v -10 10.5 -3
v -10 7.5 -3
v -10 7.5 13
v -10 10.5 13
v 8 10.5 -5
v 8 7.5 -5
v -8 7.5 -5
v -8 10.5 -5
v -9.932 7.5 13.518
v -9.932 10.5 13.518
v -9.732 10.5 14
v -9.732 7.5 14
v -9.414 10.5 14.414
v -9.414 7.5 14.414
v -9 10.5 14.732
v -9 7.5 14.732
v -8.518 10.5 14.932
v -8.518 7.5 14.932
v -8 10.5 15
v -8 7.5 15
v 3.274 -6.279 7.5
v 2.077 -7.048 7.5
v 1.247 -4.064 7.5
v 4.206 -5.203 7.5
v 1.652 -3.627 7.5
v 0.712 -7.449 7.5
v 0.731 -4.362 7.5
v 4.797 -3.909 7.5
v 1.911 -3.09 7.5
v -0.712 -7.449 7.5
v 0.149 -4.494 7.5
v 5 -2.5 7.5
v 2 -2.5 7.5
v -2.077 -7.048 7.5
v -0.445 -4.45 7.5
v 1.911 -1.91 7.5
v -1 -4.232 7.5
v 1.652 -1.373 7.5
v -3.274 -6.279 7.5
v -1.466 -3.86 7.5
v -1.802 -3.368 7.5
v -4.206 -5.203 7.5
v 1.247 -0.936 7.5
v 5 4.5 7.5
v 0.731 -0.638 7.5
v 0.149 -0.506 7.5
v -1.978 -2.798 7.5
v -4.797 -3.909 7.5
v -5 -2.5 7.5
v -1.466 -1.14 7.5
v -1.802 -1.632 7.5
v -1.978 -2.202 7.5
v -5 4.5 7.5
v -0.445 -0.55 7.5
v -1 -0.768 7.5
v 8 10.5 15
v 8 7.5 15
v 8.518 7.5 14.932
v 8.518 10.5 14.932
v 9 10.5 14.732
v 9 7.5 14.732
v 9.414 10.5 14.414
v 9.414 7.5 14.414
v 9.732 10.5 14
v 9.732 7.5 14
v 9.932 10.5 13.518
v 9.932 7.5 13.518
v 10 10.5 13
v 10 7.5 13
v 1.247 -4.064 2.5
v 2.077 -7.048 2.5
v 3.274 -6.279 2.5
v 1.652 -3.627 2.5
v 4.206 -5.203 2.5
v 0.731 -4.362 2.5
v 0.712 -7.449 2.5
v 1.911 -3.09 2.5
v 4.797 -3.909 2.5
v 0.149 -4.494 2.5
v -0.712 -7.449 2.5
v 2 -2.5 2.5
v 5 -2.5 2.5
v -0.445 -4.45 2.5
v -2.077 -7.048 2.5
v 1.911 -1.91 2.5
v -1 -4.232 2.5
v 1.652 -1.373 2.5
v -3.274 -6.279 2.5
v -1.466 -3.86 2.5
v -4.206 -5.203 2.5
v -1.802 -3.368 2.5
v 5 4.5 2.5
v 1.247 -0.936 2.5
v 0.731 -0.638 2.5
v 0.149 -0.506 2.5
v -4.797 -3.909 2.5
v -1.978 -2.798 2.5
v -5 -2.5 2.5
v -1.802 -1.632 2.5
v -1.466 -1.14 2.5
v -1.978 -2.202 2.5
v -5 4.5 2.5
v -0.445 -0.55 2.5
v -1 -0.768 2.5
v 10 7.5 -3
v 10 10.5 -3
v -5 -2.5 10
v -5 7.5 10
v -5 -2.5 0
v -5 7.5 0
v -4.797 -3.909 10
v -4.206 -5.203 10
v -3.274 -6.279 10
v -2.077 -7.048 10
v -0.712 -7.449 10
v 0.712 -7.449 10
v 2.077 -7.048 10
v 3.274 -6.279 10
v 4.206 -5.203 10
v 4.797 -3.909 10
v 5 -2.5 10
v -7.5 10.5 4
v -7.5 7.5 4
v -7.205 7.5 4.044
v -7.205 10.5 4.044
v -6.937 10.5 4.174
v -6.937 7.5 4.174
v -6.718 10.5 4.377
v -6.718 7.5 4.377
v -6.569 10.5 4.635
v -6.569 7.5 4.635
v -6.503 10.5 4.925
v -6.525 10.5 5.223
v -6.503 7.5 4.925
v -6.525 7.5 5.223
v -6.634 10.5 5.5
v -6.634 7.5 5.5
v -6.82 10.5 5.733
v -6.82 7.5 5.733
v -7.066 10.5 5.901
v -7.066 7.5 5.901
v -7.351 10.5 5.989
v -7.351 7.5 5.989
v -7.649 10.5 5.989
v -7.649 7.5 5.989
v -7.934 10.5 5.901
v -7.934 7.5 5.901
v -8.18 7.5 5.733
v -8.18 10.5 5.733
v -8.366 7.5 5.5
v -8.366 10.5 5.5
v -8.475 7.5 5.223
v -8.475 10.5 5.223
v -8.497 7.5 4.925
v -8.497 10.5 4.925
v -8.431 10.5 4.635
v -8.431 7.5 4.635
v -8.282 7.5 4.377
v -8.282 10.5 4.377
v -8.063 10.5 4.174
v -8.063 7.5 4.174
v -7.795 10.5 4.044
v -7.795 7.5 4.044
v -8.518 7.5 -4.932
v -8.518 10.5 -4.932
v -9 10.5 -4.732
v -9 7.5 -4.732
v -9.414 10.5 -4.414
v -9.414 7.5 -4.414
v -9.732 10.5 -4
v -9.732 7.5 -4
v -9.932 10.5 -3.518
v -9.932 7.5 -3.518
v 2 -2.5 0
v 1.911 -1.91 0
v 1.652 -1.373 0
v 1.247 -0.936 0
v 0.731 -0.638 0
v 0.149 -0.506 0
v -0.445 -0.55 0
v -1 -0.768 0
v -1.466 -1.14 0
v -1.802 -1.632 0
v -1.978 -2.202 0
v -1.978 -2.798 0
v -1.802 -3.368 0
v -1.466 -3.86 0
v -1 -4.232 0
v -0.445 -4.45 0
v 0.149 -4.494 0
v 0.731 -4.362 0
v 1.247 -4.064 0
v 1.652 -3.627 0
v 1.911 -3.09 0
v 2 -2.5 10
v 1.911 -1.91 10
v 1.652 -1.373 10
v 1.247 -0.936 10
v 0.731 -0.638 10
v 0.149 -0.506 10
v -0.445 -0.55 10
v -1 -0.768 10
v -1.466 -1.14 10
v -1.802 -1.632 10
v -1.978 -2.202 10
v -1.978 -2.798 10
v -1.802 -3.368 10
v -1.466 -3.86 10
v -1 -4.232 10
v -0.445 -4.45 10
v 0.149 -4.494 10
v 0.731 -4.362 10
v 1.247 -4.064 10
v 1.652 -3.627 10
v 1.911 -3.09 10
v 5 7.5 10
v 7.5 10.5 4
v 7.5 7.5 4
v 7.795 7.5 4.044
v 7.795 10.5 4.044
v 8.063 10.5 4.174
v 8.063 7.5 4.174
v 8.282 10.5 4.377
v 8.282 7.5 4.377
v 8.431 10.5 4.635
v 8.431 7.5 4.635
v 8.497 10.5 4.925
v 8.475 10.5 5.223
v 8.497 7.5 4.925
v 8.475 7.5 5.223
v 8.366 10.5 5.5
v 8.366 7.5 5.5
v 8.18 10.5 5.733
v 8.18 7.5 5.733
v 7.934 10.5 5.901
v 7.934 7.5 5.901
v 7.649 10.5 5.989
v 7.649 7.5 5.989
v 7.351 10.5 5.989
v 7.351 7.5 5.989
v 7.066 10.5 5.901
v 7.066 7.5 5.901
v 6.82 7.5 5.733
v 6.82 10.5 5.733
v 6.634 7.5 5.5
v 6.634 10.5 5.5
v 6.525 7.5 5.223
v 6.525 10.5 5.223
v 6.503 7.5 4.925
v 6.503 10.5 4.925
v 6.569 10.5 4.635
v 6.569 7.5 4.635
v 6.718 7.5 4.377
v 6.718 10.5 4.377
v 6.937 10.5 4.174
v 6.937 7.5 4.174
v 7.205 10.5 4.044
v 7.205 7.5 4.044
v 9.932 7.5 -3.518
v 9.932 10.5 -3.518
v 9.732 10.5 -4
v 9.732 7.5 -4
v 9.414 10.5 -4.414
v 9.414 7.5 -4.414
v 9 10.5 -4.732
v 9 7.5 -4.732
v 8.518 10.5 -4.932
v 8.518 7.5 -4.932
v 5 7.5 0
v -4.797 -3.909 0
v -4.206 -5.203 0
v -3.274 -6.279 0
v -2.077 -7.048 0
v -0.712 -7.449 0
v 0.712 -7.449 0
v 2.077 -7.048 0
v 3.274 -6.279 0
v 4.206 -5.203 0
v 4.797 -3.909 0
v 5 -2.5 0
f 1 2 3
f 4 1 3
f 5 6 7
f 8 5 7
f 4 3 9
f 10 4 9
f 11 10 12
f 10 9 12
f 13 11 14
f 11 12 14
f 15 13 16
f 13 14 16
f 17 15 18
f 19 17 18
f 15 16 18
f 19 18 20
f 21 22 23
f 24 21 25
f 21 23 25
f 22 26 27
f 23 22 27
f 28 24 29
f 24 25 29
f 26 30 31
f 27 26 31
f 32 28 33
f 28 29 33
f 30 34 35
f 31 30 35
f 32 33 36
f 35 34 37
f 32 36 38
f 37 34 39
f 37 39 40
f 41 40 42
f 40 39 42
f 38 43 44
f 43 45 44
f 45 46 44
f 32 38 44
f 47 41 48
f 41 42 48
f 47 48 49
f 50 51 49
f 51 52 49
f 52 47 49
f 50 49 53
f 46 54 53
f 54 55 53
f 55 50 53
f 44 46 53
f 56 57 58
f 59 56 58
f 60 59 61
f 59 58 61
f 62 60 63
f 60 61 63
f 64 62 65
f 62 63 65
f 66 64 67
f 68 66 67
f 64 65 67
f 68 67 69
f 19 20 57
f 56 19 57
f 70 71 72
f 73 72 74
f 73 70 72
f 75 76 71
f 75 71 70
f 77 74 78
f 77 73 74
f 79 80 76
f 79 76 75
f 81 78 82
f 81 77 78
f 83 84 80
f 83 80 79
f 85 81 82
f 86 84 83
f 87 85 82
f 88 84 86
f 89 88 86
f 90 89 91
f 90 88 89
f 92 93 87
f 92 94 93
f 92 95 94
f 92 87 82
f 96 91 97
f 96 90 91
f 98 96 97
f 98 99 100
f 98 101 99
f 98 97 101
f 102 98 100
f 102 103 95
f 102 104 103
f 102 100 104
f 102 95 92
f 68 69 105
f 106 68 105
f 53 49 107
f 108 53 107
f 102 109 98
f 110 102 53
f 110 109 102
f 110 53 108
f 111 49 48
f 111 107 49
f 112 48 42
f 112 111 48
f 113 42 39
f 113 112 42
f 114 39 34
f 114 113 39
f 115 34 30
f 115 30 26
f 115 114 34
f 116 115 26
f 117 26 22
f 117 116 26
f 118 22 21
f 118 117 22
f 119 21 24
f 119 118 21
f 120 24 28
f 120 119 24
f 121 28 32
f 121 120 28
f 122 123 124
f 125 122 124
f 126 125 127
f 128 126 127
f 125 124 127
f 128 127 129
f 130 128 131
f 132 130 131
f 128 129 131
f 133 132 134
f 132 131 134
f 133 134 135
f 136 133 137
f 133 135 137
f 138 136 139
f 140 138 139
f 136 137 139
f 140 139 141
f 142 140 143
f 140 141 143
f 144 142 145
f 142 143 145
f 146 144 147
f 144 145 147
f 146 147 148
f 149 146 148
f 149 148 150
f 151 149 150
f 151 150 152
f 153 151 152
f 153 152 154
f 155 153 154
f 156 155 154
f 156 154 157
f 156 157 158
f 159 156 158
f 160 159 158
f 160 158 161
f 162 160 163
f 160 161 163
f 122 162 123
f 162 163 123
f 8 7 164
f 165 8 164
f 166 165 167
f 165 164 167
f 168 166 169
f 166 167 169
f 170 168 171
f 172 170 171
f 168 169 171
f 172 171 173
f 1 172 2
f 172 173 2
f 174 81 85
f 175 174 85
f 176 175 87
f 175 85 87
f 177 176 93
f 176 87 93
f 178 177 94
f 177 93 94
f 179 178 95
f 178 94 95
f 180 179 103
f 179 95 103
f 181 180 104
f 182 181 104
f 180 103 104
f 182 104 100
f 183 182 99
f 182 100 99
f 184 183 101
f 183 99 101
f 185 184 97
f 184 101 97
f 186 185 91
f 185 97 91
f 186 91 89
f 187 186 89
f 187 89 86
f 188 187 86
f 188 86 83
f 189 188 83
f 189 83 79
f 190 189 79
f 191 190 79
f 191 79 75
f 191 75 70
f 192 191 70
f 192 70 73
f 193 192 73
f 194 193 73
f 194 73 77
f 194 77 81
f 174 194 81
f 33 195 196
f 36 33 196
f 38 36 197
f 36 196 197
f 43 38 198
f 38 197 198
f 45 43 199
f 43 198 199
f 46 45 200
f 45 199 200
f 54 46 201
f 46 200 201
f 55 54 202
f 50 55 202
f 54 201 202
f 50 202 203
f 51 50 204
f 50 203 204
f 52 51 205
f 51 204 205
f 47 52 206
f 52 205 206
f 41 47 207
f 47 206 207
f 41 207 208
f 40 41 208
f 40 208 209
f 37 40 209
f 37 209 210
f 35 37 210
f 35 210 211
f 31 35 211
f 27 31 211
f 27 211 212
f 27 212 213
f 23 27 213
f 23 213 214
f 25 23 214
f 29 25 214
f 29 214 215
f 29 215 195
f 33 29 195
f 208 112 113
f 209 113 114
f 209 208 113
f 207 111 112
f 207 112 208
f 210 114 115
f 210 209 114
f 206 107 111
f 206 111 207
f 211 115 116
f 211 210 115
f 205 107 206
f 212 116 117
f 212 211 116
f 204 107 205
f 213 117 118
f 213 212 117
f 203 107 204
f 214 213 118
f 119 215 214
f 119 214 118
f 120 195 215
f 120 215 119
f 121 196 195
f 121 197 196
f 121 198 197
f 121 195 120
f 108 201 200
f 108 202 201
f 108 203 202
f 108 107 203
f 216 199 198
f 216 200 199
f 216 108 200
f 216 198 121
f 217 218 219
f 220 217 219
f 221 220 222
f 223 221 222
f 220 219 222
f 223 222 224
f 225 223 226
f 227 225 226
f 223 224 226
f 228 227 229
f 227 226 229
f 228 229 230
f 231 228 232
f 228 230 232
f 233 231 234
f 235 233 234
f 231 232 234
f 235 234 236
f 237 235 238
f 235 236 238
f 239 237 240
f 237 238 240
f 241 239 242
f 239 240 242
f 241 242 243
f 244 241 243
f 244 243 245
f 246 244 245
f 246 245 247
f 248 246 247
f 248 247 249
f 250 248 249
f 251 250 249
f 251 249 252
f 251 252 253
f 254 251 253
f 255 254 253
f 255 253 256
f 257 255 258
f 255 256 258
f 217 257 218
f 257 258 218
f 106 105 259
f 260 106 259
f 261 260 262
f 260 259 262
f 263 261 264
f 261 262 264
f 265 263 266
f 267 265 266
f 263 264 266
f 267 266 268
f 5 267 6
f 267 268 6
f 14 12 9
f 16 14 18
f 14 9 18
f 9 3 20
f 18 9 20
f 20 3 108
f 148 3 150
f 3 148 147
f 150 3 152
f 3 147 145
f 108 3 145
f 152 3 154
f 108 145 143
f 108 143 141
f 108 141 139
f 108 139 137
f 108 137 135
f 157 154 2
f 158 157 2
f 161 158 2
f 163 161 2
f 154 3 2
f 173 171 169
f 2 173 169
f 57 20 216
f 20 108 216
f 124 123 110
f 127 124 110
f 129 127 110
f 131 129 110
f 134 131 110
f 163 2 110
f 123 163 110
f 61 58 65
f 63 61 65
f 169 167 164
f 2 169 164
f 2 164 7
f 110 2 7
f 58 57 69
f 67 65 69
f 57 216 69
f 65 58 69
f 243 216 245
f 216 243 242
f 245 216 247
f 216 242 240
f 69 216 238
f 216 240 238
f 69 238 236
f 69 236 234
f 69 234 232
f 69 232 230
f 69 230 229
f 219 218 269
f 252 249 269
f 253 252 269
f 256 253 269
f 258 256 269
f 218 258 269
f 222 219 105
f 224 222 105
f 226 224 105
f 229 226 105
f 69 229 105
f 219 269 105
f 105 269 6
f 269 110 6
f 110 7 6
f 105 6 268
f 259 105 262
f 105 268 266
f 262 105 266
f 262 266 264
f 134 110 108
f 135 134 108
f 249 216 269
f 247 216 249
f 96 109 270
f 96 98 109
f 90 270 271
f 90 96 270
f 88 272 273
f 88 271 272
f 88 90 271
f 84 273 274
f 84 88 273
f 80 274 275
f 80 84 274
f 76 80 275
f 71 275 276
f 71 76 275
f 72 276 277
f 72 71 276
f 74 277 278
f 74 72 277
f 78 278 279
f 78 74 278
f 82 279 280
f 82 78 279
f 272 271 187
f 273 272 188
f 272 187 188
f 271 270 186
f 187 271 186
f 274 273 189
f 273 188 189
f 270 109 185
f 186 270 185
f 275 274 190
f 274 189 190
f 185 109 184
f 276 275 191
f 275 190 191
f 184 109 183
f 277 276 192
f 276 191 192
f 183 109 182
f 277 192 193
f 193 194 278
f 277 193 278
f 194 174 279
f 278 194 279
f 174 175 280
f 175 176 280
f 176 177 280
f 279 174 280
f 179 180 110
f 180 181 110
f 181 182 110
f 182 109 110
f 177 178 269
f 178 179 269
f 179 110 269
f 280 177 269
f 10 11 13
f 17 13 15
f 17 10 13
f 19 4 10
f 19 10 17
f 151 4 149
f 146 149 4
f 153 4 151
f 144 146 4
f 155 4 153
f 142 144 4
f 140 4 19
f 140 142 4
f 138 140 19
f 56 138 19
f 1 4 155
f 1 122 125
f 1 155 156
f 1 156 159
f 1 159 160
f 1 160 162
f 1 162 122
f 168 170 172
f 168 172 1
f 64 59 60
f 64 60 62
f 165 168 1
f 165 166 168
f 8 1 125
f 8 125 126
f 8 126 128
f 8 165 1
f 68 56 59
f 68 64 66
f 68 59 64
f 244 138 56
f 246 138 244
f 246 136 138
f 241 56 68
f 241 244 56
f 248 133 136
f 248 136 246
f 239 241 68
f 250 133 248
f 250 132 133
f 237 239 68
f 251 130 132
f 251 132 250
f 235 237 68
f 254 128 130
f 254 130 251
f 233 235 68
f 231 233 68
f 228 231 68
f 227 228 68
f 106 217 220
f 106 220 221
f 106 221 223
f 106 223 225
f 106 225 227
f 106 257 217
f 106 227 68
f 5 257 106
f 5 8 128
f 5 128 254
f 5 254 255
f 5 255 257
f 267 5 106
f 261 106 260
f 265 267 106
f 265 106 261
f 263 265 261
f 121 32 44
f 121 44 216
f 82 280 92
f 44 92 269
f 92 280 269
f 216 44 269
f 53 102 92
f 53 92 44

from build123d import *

# Parameters (mm, degrees)
ESQUISSE1_W             = 10
ESQUISSE1_H             = 15
BOSS_EXTRU_1_DEPTH      = 10
CONG_1_RADIUS           = 5
CONG_1_LENGTH           = 10
ESQUISSE3_W             = 5
ESQUISSE3_H             = 12
ENL_V_MAT_EXTRU_1_DEPTH = 10
ESQUISSE4_W             = 10
ESQUISSE4_H             = 10
BOSS_EXTRU_2_DEPTH      = 3
ESQUISSE5_R             = 1
ENL_V_MAT_EXTRU_2_DEPTH = 3
ESQUISSE6_R             = 2
ENL_V_MAT_EXTRU_3_DEPTH = 21.862646045


with BuildPart() as part:
    # Esquisse1 → Boss.-Extru.1 (new body)
    with BuildSketch(Plane.XY):
        Rectangle(ESQUISSE1_W, ESQUISSE1_H)
    extrude(amount=BOSS_EXTRU_1_DEPTH)

    # Congé1: full round fillet: the end face becomes a half cylinder, R = half its width
    cong_1_face = Plane((0, -7.5, 5), x_dir=(0, 0, 1), z_dir=(0, -1, 0))  # on the end face: x along it, z out of the body
    cong_1_slab = cong_1_face.offset(-CONG_1_RADIUS / 2) * Box(CONG_1_LENGTH, 2 * CONG_1_RADIUS, CONG_1_RADIUS, mode=Mode.PRIVATE)  # the body's end, R deep
    cong_1_round = Plane((0, -2.5, 5), x_dir=(0, -1, 0), z_dir=(0, 0, 1)) * Cylinder(CONG_1_RADIUS, CONG_1_LENGTH, mode=Mode.PRIVATE)  # its axis R under the face
    add(cong_1_slab - cong_1_round, mode=Mode.SUBTRACT)

    # Esquisse3 → Enlèv. mat.-Extru.1 (cut)
    with BuildSketch(Plane.ZY.offset(5)):
        with Locations((5, -1.5)):
            Rectangle(ESQUISSE3_W, ESQUISSE3_H)
    extrude(amount=-ENL_V_MAT_EXTRU_1_DEPTH, mode=Mode.SUBTRACT)

    # Esquisse4 → Boss.-Extru.2 (add)
    # profile 1 of 2: a face of its own
    with BuildSketch(Plane(origin=(0, 7.5, 0), x_dir=(1, 0, 0), z_dir=(0, 1, 0))):
        with BuildLine():
            Line((8, 5), (-8, 5))
            ThreePointArc((-8, 5), (-9.414213562, 4.414213562), (-10, 3))
            Line((-10, 3), (-10, -13))
            ThreePointArc((-10, -13), (-9.414213562, -14.414213562), (-8, -15))
            Line((-8, -15), (8, -15))
            ThreePointArc((8, -15), (9.414213562, -14.414213562), (10, -13))
            Line((10, -13), (10, 3))
            ThreePointArc((10, 3), (9.414213562, 4.414213562), (8, 5))
        make_face()
        with Locations((0, -5)):
            Rectangle(ESQUISSE4_W, ESQUISSE4_H, mode=Mode.SUBTRACT)
    # profile 2 of 2: a face of its own
    with BuildSketch(Plane(origin=(0, 7.5, 0), x_dir=(1, 0, 0), z_dir=(0, 1, 0))):
        with Locations((0, -5)):
            Rectangle(ESQUISSE4_W, ESQUISSE4_H)
    extrude(amount=BOSS_EXTRU_2_DEPTH)

    # Esquisse5 → Enlèv. mat.-Extru.2 (cut)
    with BuildSketch(Plane.XZ.offset(-7.5)):
        with Locations(Location((-7.5, 5, 0), (0, 0, 270))):
            Circle(ESQUISSE5_R)
        with Locations(Location((7.5, 5, 0), (0, 0, 270))):
            Circle(ESQUISSE5_R)
    extrude(amount=-ENL_V_MAT_EXTRU_2_DEPTH, mode=Mode.SUBTRACT)

    # Esquisse6 → Enlèv. mat.-Extru.3 (cut, through all)
    with BuildSketch(Plane.XY.offset(10)):
        with Locations((0, -2.5)):
            Circle(ESQUISSE6_R)
    extrude(amount=-ENL_V_MAT_EXTRU_3_DEPTH, mode=Mode.SUBTRACT)


solid = part.part
